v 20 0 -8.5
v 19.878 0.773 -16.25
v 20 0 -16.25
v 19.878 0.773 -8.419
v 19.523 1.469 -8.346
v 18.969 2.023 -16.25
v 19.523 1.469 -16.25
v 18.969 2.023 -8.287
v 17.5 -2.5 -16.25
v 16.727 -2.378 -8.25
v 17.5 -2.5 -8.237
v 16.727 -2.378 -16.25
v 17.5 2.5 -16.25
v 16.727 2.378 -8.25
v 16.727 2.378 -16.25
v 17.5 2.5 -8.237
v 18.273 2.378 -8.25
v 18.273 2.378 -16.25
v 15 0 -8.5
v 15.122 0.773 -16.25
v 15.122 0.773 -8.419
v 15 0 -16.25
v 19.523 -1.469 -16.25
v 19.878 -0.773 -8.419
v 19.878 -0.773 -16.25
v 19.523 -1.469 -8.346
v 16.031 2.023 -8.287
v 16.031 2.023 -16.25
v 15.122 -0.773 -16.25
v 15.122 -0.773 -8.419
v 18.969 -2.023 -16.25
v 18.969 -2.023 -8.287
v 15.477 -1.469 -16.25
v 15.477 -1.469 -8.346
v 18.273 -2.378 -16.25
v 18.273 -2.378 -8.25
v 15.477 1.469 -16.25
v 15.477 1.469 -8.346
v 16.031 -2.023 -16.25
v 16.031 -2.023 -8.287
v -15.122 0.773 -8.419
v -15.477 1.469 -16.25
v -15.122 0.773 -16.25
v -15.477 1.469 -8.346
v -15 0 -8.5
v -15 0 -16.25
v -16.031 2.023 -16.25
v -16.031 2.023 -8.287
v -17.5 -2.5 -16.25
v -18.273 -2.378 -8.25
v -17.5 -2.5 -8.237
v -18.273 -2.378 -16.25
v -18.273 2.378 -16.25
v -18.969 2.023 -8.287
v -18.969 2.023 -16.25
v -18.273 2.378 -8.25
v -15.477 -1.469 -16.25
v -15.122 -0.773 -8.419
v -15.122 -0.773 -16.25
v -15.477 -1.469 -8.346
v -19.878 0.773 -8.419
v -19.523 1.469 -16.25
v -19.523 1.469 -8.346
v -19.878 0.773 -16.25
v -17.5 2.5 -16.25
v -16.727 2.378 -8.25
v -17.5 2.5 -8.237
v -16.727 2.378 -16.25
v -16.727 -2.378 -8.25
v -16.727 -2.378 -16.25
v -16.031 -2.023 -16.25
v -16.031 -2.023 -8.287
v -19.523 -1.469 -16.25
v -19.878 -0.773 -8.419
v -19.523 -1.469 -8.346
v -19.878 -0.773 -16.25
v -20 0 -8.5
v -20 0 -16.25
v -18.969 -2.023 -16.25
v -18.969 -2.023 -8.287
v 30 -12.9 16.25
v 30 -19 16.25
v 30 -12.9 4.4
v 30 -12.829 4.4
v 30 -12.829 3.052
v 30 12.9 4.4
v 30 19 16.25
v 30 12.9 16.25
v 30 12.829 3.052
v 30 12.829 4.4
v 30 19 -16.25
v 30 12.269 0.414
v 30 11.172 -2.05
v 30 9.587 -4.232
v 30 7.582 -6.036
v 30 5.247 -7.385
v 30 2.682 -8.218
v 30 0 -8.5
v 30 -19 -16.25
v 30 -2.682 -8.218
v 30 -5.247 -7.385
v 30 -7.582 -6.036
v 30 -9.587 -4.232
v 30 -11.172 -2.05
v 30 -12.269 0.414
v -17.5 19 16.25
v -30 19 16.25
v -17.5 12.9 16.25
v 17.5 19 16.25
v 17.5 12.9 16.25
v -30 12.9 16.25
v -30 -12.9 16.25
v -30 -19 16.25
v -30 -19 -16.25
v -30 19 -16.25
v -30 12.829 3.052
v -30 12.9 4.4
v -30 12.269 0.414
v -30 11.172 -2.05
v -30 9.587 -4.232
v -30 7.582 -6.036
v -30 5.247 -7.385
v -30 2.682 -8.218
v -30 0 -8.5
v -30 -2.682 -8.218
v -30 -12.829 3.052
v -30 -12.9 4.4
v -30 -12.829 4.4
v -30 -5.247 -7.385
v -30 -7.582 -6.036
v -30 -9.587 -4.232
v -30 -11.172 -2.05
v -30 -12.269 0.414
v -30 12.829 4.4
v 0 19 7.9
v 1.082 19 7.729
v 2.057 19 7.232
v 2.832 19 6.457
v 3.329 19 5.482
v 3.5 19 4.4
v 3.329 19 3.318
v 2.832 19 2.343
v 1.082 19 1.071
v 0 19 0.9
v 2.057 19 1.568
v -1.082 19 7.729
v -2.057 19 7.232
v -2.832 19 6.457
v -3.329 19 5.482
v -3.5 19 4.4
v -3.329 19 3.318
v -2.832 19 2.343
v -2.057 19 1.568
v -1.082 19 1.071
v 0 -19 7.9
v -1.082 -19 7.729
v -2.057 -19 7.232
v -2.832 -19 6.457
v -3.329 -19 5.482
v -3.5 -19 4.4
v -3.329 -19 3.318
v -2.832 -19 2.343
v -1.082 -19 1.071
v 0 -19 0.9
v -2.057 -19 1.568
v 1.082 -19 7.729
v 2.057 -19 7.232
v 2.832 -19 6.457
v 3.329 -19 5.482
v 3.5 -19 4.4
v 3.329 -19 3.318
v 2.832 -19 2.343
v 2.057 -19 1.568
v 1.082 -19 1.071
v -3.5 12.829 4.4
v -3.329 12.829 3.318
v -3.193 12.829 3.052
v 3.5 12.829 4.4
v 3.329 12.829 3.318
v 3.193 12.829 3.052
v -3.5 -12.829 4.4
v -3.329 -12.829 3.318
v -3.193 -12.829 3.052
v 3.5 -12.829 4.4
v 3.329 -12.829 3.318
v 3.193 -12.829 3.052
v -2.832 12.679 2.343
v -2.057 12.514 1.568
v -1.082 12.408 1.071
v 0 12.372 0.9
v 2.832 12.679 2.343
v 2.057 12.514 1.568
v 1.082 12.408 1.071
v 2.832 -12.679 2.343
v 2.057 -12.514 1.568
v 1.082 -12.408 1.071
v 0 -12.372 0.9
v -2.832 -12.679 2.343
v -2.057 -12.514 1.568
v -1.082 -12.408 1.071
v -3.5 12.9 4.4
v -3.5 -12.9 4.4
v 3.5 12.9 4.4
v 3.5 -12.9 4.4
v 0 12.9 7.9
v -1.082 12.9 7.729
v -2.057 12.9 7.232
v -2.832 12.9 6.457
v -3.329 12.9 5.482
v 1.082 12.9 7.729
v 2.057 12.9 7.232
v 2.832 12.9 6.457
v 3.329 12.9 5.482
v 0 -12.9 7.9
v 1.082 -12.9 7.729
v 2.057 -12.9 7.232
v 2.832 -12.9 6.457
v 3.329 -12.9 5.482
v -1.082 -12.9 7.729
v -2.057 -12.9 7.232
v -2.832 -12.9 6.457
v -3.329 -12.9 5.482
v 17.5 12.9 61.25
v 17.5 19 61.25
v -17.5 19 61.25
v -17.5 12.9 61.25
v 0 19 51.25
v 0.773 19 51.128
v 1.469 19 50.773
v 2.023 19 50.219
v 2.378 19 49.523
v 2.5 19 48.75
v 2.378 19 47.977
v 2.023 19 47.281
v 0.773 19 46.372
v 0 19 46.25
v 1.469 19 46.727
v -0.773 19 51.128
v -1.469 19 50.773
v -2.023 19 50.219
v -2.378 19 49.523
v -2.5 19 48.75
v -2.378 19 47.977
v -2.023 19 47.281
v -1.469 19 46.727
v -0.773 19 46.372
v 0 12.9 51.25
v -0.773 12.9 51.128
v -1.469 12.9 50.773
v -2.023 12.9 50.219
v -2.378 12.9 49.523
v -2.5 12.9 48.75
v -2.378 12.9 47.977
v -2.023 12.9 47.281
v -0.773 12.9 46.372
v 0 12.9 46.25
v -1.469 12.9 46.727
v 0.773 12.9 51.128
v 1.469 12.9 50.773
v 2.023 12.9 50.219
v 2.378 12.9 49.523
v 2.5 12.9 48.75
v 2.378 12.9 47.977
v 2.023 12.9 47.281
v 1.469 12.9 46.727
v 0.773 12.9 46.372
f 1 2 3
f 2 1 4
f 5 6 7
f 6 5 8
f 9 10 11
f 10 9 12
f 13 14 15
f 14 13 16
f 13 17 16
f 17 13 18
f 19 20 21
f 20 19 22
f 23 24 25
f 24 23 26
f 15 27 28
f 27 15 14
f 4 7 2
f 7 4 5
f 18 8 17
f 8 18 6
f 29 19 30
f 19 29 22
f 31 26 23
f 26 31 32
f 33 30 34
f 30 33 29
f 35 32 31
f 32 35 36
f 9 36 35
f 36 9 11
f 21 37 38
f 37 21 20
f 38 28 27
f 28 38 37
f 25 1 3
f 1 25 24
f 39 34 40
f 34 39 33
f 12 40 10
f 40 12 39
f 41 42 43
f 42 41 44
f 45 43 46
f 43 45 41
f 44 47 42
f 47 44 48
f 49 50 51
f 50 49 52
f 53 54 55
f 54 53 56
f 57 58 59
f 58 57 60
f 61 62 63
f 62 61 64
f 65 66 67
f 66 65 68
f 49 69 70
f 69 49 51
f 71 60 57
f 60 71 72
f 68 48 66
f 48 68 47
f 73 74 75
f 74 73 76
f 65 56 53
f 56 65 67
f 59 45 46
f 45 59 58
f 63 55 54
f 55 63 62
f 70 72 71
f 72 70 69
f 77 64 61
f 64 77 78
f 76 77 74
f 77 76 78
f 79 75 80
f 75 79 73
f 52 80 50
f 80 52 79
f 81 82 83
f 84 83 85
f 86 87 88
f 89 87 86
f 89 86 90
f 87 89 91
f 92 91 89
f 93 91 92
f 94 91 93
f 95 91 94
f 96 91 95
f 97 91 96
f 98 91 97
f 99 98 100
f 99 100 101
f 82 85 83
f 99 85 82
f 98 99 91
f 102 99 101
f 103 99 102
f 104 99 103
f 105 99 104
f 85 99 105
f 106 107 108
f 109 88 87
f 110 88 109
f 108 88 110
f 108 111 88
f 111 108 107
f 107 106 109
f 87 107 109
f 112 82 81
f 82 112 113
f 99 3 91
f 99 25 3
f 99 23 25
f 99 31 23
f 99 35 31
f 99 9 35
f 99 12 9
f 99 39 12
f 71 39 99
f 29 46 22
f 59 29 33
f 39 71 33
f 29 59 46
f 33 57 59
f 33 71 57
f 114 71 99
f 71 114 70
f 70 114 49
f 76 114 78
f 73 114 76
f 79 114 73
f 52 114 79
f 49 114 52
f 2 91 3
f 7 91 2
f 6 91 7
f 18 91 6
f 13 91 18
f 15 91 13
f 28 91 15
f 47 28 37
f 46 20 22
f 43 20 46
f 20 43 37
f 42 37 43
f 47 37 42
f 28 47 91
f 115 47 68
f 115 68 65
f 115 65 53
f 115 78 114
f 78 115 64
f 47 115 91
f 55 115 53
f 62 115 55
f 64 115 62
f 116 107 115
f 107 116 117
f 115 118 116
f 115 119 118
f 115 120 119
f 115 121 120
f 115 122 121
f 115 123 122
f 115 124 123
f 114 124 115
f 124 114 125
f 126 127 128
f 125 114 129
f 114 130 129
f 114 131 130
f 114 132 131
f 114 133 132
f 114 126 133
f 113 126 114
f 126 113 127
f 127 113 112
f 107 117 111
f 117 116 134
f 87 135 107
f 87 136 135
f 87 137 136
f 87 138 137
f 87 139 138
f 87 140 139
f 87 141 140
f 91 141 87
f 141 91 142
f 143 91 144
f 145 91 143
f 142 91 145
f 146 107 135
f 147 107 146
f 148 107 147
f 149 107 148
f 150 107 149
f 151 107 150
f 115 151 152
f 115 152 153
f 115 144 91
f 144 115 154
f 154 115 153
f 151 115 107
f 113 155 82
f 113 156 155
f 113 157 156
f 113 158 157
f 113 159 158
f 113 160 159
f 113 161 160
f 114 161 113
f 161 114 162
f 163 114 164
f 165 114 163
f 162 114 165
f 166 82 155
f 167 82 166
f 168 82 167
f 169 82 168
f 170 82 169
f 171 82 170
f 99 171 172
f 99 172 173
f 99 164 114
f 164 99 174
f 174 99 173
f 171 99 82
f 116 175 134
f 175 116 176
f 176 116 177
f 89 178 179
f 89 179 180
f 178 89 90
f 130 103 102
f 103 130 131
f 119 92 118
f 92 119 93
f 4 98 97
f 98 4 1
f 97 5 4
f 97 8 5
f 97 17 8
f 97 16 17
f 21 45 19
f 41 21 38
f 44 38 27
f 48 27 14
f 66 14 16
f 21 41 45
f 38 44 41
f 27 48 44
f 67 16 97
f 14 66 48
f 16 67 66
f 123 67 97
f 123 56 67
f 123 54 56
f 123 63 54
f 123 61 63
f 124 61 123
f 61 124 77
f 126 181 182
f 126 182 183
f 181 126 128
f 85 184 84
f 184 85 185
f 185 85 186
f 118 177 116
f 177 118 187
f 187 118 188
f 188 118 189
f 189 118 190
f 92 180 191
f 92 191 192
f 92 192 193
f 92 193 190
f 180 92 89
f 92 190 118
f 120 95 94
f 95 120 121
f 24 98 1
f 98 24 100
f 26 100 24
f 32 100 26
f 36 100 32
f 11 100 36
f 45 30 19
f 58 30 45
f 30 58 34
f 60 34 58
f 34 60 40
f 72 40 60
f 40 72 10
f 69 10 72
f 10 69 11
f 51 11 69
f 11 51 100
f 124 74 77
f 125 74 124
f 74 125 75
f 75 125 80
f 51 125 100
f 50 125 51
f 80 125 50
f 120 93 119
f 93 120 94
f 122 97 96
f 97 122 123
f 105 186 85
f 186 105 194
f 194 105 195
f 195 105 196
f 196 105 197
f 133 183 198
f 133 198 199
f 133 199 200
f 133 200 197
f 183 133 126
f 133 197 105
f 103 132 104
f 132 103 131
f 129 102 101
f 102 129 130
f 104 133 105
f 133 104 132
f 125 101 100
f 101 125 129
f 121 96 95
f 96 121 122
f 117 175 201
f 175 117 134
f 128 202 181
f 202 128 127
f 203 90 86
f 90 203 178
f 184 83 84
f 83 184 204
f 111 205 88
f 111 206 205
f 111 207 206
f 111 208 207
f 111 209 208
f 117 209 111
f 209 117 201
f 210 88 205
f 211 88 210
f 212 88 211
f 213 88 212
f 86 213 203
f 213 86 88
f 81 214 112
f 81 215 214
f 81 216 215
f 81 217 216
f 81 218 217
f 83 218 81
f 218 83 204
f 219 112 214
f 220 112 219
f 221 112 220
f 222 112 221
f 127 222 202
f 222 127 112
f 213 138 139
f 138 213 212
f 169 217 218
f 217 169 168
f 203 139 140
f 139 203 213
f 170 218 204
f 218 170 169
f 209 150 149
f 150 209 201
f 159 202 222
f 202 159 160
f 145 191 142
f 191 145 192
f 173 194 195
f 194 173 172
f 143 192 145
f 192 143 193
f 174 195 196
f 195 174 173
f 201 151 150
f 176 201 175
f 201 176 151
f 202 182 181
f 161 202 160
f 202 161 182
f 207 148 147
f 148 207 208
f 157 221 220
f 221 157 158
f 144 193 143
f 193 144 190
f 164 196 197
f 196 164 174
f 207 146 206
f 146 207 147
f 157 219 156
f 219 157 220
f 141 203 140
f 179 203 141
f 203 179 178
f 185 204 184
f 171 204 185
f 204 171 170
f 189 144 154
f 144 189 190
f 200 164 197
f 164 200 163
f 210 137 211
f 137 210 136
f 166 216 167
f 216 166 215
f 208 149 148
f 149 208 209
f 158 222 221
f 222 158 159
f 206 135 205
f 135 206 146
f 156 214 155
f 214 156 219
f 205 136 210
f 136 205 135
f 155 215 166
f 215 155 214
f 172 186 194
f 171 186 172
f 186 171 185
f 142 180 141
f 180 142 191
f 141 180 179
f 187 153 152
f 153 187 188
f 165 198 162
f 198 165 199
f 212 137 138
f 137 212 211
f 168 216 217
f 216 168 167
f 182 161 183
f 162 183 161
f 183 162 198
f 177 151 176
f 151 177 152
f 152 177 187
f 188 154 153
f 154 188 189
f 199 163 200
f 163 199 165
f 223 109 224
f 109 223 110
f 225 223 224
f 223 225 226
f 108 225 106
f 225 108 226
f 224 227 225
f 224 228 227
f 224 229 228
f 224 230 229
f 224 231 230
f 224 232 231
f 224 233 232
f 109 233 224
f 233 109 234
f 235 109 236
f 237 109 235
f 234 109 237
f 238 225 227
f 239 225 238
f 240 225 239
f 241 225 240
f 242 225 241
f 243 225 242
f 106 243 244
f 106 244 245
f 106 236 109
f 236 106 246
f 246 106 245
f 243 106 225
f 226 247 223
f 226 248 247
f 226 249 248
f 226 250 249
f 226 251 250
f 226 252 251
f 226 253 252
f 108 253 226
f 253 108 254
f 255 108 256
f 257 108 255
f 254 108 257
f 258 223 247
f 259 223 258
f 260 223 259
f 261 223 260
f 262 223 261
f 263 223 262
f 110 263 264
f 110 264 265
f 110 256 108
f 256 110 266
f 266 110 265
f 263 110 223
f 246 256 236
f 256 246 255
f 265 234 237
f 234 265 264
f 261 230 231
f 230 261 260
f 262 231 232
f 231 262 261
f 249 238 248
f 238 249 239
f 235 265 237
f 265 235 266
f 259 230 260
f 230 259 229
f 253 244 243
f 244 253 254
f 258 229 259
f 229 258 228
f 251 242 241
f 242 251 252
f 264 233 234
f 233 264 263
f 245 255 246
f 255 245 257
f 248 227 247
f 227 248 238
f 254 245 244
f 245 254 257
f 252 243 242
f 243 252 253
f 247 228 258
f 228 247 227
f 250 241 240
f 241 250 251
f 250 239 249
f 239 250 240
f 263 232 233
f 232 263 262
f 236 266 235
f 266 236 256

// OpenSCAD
nakladka_sz = 38; //31.4
nakladka_dl = 60;
nakladka_h = 32.5;
dno_grubosc = 7.75;

rama_sr = 25.8;

sruba_sr = 5;
sruba_od_dna = 15.35;
sruba_od_boku = 12.7;
sruby_odstep = 35;

mocowanie_h = 45; //35
mocowanie_sr1 = 10; // lub 12
mocowanie_gr = (nakladka_sz-rama_sr)/2;
mocowanie_dl = 35;

module sruba_dziura(sr){
    rotate([90,0,0]){
        cylinder(h=nakladka_sz+30, d=sr, center=true, $fn=20);
        
    }
}

module mocowanie(h, sr1, gr, dl, sr2){
    difference(){
    cube([dl, gr, h],center = true);
    
  
    translate([0,0,h/2-10-sr2/2]){
    rotate([90,0,0]){
    cylinder(gr+10, d=sr2, center=true, $fn=20);
    }
    }
    
    }
}

union(){
    difference(){
        cube([nakladka_dl, nakladka_sz, nakladka_h], center=true);
        
        translate([0,0,-nakladka_h/2+dno_grubosc+rama_sr/2]){
        rotate([0,90,0]){
            cylinder(h=nakladka_dl+30, d=rama_sr, center=true);
            
        }
        }
        
        translate([0,0,dno_grubosc+rama_sr/2]){
            cube([nakladka_dl+30, rama_sr, nakladka_h],center = true);
        }
        rotate([-90,0,0]){
        translate([sruby_odstep/2,0,0]){
            sruba_dziura(sruba_sr);
            
            translate([-sruby_odstep,0,0]){
               sruba_dziura(sruba_sr); 
            }}
            

            
        }
        translate([0,0,-nakladka_h/2+dno_grubosc+rama_sr/2]){
            rotate([0,0,0]){
                sruba_dziura(7); 
            }
        }

        
    }

    translate([0,nakladka_sz/2-mocowanie_gr/2,nakladka_h/2+mocowanie_h/2]){
        mocowanie(mocowanie_h, mocowanie_sr1, mocowanie_gr, mocowanie_dl, 5);
    }

}
